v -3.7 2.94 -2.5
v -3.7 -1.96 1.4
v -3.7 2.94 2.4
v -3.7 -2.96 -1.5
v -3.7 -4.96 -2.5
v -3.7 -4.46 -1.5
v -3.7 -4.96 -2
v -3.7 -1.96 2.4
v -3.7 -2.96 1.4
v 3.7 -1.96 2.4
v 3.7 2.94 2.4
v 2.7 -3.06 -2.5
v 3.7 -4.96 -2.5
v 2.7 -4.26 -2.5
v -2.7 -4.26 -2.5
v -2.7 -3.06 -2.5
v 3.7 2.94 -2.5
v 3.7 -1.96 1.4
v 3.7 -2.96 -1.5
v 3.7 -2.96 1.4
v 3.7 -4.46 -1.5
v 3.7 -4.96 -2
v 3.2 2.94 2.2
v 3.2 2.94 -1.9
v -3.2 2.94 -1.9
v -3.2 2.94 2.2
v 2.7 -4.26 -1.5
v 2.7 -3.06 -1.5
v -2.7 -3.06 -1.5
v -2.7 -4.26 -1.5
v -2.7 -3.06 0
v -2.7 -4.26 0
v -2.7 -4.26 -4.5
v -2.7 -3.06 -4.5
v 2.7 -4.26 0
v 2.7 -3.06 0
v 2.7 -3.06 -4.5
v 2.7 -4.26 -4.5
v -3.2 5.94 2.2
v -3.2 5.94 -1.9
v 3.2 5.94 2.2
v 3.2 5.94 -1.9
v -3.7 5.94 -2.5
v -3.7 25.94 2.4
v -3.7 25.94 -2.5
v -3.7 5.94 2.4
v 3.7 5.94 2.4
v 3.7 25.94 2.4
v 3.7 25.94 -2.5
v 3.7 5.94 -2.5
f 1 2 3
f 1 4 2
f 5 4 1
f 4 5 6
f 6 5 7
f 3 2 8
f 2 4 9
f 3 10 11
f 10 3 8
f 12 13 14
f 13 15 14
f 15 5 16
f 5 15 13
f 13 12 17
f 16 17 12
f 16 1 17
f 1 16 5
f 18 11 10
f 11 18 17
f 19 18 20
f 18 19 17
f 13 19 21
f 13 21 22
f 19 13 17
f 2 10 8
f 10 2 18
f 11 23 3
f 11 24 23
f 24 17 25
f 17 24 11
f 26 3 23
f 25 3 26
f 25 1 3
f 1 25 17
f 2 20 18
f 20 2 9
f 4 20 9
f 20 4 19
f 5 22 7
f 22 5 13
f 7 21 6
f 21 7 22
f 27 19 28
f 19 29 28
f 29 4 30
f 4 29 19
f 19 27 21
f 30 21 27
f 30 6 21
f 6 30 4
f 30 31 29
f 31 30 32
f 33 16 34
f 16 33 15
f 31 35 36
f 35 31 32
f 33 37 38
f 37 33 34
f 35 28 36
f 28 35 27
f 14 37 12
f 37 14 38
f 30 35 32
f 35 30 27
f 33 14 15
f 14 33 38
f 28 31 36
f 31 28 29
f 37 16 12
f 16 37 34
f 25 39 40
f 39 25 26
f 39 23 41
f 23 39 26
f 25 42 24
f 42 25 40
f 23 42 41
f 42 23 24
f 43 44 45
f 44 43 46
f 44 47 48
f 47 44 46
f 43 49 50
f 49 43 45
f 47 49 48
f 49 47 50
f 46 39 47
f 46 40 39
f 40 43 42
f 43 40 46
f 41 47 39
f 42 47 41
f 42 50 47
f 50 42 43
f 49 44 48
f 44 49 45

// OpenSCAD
N=2;
A=2.4+N*2.5;
rotate([0,0,180])
translate([-A/2,-2.94,-2.5])
{
	cube([A,4.9,4.9]);
	cube([A,5.9,3.9]);
	hull()
	{
		cube([A,7.4,1]);
		cube([A,7.9,0.5]);
	}
	translate([1,6,-2])cube([A-2,1.2,4.5]); // Assumes cropped pins
	// Plug
	translate([0.5,-20,0.6])cube([A-1,21,4.1]);
	translate([0,-23,0])cube([A,20,4.9]);
}
